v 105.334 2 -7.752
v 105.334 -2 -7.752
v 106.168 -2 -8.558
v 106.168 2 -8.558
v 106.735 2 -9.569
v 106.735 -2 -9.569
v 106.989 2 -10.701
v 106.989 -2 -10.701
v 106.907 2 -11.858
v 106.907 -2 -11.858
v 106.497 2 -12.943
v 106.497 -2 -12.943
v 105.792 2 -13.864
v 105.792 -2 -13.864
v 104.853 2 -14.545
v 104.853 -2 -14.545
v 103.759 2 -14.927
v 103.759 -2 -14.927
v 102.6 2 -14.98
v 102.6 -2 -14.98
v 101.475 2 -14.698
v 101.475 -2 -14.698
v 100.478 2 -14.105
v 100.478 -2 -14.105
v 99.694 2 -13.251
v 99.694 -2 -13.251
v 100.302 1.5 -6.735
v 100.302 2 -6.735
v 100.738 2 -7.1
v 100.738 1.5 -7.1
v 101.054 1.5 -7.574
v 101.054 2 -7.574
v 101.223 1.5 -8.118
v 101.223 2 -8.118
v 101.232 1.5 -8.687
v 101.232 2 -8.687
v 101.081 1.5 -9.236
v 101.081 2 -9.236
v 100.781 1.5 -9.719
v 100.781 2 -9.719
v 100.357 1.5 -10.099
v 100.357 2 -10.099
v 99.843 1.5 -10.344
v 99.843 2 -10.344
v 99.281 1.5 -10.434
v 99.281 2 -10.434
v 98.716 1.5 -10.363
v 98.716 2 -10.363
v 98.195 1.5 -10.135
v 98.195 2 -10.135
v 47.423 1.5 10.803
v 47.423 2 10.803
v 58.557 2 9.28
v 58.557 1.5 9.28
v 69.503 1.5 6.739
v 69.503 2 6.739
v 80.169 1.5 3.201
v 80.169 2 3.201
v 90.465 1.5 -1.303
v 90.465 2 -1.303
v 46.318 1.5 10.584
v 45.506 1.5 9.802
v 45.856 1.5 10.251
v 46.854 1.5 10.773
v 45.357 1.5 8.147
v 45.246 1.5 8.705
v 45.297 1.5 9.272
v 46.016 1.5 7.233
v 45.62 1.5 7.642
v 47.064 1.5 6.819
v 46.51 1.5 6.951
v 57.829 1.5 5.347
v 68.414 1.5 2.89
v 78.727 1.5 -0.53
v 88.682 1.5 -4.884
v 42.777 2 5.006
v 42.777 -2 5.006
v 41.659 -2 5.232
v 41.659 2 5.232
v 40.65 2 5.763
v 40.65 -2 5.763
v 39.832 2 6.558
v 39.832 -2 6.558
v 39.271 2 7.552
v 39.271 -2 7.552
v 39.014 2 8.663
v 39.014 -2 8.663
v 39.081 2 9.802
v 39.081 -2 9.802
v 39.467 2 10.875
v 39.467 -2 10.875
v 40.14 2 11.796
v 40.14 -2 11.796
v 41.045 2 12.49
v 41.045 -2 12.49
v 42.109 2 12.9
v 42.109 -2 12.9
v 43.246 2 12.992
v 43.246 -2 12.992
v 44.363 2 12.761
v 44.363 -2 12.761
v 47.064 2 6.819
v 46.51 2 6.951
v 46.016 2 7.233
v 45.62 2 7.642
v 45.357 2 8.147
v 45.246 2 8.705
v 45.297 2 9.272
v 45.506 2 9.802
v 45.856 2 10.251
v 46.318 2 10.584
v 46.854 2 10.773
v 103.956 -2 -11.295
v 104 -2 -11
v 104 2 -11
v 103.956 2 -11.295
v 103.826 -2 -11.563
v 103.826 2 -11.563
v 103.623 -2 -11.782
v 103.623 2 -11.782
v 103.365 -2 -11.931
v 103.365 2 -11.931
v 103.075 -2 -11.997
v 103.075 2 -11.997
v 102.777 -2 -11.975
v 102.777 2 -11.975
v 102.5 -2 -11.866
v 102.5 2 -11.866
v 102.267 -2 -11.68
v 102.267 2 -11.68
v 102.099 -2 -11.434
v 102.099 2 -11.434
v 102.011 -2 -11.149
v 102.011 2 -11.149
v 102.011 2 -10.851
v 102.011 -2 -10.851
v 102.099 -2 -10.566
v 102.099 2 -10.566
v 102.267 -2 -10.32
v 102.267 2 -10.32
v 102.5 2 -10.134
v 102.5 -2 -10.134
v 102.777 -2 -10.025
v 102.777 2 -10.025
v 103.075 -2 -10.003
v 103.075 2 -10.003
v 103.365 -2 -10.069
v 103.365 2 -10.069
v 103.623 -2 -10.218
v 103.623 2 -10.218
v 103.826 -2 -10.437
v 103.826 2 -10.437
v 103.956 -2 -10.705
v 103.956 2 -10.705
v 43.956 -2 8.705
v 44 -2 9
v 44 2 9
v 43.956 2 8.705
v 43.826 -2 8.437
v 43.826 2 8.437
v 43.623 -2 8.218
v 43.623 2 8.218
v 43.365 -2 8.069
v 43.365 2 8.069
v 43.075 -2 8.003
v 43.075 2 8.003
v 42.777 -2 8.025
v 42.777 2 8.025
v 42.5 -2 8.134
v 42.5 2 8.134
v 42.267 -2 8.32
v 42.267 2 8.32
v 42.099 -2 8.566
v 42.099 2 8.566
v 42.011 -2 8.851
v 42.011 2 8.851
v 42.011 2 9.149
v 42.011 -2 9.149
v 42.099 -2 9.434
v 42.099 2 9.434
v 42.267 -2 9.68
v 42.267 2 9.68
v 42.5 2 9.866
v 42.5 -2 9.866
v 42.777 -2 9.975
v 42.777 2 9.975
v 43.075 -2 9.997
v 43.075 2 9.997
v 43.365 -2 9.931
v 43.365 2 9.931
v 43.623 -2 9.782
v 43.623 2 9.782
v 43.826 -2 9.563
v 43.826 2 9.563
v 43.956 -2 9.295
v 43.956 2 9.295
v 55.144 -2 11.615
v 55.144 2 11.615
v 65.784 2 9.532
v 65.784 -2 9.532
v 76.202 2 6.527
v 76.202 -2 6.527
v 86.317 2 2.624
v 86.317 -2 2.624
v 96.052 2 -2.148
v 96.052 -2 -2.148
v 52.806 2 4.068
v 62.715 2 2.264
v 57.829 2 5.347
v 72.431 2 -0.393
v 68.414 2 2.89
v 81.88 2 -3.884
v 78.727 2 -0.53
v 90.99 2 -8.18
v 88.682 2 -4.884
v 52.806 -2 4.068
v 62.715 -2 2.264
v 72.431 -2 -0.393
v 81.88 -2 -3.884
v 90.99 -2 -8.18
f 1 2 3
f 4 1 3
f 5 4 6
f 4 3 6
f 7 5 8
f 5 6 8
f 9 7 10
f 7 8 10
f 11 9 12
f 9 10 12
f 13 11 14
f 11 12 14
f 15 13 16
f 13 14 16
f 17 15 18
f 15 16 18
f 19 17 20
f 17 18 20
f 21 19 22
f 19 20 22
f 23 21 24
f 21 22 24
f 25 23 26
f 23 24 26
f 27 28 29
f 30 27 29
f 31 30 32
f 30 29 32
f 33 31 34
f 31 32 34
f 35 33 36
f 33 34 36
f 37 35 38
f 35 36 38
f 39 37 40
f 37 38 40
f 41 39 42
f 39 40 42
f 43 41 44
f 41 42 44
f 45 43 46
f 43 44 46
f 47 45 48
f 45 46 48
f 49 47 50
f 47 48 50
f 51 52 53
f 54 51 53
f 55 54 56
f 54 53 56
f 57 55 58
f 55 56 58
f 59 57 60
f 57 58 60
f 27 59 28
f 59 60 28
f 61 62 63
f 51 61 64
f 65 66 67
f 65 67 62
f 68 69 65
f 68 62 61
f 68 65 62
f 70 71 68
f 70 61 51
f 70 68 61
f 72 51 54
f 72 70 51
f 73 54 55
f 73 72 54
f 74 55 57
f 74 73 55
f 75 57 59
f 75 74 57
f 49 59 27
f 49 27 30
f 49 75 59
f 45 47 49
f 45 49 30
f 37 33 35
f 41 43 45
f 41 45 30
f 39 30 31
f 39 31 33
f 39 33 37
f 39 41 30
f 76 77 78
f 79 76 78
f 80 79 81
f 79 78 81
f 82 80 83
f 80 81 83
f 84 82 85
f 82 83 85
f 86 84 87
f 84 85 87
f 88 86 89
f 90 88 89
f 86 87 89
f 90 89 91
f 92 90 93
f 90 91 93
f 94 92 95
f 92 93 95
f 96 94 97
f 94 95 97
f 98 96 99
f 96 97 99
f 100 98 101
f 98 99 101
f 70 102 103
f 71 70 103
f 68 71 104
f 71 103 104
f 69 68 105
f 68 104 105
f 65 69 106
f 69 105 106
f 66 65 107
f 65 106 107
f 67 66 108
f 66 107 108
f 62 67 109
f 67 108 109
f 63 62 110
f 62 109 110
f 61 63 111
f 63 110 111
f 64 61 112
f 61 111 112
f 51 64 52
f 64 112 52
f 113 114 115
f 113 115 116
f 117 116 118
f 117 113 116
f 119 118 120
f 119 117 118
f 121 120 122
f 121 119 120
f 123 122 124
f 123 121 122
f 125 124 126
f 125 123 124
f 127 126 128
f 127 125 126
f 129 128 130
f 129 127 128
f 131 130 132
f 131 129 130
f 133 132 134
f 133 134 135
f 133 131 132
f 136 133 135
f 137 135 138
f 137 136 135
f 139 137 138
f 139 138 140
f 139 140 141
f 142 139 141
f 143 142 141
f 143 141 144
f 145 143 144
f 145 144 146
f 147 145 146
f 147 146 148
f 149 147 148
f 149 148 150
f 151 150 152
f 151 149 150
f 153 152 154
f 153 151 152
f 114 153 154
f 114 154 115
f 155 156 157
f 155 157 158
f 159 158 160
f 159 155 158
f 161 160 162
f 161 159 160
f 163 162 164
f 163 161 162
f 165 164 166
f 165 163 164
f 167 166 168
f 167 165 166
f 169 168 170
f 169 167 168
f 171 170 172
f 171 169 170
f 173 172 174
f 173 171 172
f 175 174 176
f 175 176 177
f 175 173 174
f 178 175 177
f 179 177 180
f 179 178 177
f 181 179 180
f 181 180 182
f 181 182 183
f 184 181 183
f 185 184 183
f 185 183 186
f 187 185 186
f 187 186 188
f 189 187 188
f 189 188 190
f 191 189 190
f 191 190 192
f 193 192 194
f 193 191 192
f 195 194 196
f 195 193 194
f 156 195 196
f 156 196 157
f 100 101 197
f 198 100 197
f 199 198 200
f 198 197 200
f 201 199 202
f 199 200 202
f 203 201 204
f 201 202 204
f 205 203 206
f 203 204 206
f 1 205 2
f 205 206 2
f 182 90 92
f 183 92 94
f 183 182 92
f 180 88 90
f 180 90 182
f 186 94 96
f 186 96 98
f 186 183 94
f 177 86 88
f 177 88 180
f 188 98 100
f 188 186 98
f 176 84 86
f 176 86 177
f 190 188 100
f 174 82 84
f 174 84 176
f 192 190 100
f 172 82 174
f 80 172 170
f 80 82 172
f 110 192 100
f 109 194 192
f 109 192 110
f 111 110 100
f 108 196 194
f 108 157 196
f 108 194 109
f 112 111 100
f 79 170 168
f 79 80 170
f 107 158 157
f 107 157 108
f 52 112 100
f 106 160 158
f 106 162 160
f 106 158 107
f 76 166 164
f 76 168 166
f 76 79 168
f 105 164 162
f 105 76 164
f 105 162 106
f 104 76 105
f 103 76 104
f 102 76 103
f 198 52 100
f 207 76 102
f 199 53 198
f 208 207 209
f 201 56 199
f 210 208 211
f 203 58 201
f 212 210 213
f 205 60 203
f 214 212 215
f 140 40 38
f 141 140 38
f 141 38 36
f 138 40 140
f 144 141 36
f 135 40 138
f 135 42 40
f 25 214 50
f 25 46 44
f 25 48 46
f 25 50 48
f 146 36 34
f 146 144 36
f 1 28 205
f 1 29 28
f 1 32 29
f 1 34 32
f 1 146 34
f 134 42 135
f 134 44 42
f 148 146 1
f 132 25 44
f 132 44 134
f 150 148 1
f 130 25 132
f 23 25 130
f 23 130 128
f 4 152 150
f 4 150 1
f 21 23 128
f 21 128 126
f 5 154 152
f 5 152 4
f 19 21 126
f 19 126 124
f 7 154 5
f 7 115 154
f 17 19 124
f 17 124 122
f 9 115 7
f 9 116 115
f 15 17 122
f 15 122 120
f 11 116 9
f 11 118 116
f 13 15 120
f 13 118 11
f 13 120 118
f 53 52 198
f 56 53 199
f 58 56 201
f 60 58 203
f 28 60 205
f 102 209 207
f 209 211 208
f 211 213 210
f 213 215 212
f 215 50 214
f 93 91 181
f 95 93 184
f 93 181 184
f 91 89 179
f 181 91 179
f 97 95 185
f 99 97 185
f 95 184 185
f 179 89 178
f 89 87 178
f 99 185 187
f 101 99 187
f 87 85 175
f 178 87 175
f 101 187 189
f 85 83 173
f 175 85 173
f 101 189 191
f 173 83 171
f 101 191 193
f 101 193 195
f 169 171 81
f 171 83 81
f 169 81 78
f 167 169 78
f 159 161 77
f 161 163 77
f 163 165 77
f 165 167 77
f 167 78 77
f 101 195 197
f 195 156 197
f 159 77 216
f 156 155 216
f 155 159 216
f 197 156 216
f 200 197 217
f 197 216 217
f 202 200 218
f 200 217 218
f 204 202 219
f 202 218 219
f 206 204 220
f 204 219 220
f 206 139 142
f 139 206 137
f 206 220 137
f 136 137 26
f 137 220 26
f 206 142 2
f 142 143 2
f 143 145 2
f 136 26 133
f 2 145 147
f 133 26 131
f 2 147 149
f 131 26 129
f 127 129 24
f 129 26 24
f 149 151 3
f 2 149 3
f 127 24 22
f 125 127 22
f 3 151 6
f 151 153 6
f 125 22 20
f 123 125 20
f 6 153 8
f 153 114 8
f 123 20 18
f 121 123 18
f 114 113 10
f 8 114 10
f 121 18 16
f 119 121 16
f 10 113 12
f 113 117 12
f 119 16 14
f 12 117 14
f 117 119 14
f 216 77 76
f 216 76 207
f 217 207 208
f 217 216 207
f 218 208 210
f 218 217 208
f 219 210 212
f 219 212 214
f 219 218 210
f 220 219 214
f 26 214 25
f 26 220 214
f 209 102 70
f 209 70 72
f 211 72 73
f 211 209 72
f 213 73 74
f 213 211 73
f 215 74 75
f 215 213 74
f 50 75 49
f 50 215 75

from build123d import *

# Parameters (mm, degrees)
SKETCH_R     = 1
PAD_DEPTH    = 4
POCKET_DEPTH = 0.5


with BuildPart() as part:
    # Sketch → Pad (new body)
    with BuildSketch(Plane(origin=(43, -2, 9), x_dir=(1, 0, 0), z_dir=(0, 1, 0))):
        with BuildLine():
            ThreePointArc((-0.223332, 3.993761), (-3.918859, -0.801586), (1.362808, -3.760685))
            ThreePointArc((1.362808, -3.760685), (33.201741, 2.472732), (62.334, 16.751548))
            ThreePointArc((62.334, 16.751548), (62.792415, 22.863986), (56.693532, 22.25106))
            ThreePointArc((-0.223332, 3.993761), (29.431262, 9.393393), (56.693532, 22.25106))
        make_face()
        Circle(SKETCH_R, mode=Mode.SUBTRACT)
        with Locations((60, 20)):
            Circle(SKETCH_R, mode=Mode.SUBTRACT)
    extrude(amount=PAD_DEPTH)

    # Sketch001 → Pocket (cut)
    with BuildSketch(Plane(origin=(43, 2, 9), x_dir=(1, 0, 0), z_dir=(0, 1, 0))):
        with BuildLine():
            ThreePointArc((4.422958, -1.803146), (31.876892, 3.906972), (57.301864, 15.734682))
            ThreePointArc((57.301864, 15.734682), (57.948359, 18.488233), (55.194808, 19.134728))
            ThreePointArc((4.063939, 2.180709), (30.609778, 7.70096), (55.194808, 19.134728))
            ThreePointArc((4.063939, 2.180709), (2.251525, 0.009273), (4.422958, -1.803146))
        make_face()
    extrude(amount=-POCKET_DEPTH, mode=Mode.SUBTRACT)


solid = part.part
